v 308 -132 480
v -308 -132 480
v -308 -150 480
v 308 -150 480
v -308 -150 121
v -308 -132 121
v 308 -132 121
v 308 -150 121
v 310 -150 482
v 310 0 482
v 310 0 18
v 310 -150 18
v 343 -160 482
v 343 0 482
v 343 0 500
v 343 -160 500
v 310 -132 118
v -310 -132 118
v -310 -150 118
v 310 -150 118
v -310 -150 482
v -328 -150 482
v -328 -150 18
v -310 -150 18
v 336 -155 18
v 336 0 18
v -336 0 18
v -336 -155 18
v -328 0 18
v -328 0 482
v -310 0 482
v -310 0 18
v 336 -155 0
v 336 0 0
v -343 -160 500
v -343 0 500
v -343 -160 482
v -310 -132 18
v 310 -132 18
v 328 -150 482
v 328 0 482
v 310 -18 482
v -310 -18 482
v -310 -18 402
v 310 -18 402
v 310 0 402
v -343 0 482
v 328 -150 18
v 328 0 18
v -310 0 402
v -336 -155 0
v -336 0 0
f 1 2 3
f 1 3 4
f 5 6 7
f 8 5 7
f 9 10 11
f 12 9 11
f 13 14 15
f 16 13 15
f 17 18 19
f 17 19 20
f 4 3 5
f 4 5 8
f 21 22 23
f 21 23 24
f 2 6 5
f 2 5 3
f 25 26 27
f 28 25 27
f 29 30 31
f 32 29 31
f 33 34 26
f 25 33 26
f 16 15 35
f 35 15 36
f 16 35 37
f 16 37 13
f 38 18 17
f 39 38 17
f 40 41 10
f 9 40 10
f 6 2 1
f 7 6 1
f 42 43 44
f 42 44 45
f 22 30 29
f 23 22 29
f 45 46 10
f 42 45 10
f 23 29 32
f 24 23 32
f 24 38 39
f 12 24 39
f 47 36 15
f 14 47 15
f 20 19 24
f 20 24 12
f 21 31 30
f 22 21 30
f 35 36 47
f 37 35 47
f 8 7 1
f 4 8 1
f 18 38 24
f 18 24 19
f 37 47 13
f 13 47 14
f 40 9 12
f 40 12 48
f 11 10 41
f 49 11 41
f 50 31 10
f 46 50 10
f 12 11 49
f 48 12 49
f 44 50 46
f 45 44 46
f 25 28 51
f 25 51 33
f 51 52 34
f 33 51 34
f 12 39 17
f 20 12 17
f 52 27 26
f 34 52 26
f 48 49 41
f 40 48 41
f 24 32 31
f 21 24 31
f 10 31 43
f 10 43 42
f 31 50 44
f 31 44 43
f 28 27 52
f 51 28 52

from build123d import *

# Parameters (mm, degrees)
F2_DEPTH = 150
F3_DEPTH = 155
F4_START = 132
F1_W     = 620
F1_H     = 100
F4_DEPTH = 18
F5_DEPTH = 160
F6_START = 132
F1_W_2   = 616
F1_H_2   = 359
F6_DEPTH = 18
F7_W     = 620
F7_H     = 80
F8_DEPTH = 18


# Not quite as in the source:
# - a feature of the source that left no trace in its solid (it failed there, or was rolled back) is left out


with BuildPart() as f2:
    # F1 (on Front) → F2 (new body)
    with BuildSketch(Plane.XZ):
        Polygon((-310, 118), (-310, 482), (-328, 482), (-328, 18), (-310, 18), align=None)
    extrude(amount=F2_DEPTH)


with BuildPart() as f2b:
    # F1 (on Front) → F2, piece 2 (new body)
    with BuildSketch(Plane.XZ):
        Polygon((328, 482), (310, 482), (310, 118), (310, 18), (328, 18), align=None)
    extrude(amount=F2_DEPTH)


with BuildPart() as f3:
    # F1 (on Front) → F3 (new body, through all)
    with BuildSketch(Plane.XZ):
        Polygon((310, 18), (-310, 18), (-328, 18), (-336, 18), (-336, 0), (-328, 0), (328, 0), (336, 0), (336, 18), (328, 18), align=None)
    extrude(amount=F3_DEPTH)


with BuildPart() as f4:
    # F1 (on Front) → F4 (new body)
    with BuildSketch(Plane.XZ.offset(F4_START)):
        with Locations((0, 68)):
            Rectangle(F1_W, F1_H)
    extrude(amount=F4_DEPTH)


with BuildPart() as f5:
    # F1 (on Front) → F5 (new body, through all)
    with BuildSketch(Plane.XZ):
        Polygon((-328, 482), (-310, 482), (310, 482), (328, 482), (343, 482), (343, 500), (328, 500), (-328, 500), (-343, 500), (-343, 482), align=None)
    extrude(amount=F5_DEPTH)


with BuildPart() as f6:
    # F1 (on Front) → F6 (new body)
    with BuildSketch(Plane.XZ.offset(F6_START)):
        with Locations((0, 300.5)):
            Rectangle(F1_W_2, F1_H_2)
    extrude(amount=F6_DEPTH)


with BuildPart() as f8:
    # F7 (on face) → F8 (new body)
    with BuildSketch(Plane.XZ):
        with Locations((0, 442)):
            Rectangle(F7_W, F7_H)
    extrude(amount=F8_DEPTH)


solid = Compound([f2.part, f2b.part, f3.part, f4.part, f5.part, f6.part, f8.part])
